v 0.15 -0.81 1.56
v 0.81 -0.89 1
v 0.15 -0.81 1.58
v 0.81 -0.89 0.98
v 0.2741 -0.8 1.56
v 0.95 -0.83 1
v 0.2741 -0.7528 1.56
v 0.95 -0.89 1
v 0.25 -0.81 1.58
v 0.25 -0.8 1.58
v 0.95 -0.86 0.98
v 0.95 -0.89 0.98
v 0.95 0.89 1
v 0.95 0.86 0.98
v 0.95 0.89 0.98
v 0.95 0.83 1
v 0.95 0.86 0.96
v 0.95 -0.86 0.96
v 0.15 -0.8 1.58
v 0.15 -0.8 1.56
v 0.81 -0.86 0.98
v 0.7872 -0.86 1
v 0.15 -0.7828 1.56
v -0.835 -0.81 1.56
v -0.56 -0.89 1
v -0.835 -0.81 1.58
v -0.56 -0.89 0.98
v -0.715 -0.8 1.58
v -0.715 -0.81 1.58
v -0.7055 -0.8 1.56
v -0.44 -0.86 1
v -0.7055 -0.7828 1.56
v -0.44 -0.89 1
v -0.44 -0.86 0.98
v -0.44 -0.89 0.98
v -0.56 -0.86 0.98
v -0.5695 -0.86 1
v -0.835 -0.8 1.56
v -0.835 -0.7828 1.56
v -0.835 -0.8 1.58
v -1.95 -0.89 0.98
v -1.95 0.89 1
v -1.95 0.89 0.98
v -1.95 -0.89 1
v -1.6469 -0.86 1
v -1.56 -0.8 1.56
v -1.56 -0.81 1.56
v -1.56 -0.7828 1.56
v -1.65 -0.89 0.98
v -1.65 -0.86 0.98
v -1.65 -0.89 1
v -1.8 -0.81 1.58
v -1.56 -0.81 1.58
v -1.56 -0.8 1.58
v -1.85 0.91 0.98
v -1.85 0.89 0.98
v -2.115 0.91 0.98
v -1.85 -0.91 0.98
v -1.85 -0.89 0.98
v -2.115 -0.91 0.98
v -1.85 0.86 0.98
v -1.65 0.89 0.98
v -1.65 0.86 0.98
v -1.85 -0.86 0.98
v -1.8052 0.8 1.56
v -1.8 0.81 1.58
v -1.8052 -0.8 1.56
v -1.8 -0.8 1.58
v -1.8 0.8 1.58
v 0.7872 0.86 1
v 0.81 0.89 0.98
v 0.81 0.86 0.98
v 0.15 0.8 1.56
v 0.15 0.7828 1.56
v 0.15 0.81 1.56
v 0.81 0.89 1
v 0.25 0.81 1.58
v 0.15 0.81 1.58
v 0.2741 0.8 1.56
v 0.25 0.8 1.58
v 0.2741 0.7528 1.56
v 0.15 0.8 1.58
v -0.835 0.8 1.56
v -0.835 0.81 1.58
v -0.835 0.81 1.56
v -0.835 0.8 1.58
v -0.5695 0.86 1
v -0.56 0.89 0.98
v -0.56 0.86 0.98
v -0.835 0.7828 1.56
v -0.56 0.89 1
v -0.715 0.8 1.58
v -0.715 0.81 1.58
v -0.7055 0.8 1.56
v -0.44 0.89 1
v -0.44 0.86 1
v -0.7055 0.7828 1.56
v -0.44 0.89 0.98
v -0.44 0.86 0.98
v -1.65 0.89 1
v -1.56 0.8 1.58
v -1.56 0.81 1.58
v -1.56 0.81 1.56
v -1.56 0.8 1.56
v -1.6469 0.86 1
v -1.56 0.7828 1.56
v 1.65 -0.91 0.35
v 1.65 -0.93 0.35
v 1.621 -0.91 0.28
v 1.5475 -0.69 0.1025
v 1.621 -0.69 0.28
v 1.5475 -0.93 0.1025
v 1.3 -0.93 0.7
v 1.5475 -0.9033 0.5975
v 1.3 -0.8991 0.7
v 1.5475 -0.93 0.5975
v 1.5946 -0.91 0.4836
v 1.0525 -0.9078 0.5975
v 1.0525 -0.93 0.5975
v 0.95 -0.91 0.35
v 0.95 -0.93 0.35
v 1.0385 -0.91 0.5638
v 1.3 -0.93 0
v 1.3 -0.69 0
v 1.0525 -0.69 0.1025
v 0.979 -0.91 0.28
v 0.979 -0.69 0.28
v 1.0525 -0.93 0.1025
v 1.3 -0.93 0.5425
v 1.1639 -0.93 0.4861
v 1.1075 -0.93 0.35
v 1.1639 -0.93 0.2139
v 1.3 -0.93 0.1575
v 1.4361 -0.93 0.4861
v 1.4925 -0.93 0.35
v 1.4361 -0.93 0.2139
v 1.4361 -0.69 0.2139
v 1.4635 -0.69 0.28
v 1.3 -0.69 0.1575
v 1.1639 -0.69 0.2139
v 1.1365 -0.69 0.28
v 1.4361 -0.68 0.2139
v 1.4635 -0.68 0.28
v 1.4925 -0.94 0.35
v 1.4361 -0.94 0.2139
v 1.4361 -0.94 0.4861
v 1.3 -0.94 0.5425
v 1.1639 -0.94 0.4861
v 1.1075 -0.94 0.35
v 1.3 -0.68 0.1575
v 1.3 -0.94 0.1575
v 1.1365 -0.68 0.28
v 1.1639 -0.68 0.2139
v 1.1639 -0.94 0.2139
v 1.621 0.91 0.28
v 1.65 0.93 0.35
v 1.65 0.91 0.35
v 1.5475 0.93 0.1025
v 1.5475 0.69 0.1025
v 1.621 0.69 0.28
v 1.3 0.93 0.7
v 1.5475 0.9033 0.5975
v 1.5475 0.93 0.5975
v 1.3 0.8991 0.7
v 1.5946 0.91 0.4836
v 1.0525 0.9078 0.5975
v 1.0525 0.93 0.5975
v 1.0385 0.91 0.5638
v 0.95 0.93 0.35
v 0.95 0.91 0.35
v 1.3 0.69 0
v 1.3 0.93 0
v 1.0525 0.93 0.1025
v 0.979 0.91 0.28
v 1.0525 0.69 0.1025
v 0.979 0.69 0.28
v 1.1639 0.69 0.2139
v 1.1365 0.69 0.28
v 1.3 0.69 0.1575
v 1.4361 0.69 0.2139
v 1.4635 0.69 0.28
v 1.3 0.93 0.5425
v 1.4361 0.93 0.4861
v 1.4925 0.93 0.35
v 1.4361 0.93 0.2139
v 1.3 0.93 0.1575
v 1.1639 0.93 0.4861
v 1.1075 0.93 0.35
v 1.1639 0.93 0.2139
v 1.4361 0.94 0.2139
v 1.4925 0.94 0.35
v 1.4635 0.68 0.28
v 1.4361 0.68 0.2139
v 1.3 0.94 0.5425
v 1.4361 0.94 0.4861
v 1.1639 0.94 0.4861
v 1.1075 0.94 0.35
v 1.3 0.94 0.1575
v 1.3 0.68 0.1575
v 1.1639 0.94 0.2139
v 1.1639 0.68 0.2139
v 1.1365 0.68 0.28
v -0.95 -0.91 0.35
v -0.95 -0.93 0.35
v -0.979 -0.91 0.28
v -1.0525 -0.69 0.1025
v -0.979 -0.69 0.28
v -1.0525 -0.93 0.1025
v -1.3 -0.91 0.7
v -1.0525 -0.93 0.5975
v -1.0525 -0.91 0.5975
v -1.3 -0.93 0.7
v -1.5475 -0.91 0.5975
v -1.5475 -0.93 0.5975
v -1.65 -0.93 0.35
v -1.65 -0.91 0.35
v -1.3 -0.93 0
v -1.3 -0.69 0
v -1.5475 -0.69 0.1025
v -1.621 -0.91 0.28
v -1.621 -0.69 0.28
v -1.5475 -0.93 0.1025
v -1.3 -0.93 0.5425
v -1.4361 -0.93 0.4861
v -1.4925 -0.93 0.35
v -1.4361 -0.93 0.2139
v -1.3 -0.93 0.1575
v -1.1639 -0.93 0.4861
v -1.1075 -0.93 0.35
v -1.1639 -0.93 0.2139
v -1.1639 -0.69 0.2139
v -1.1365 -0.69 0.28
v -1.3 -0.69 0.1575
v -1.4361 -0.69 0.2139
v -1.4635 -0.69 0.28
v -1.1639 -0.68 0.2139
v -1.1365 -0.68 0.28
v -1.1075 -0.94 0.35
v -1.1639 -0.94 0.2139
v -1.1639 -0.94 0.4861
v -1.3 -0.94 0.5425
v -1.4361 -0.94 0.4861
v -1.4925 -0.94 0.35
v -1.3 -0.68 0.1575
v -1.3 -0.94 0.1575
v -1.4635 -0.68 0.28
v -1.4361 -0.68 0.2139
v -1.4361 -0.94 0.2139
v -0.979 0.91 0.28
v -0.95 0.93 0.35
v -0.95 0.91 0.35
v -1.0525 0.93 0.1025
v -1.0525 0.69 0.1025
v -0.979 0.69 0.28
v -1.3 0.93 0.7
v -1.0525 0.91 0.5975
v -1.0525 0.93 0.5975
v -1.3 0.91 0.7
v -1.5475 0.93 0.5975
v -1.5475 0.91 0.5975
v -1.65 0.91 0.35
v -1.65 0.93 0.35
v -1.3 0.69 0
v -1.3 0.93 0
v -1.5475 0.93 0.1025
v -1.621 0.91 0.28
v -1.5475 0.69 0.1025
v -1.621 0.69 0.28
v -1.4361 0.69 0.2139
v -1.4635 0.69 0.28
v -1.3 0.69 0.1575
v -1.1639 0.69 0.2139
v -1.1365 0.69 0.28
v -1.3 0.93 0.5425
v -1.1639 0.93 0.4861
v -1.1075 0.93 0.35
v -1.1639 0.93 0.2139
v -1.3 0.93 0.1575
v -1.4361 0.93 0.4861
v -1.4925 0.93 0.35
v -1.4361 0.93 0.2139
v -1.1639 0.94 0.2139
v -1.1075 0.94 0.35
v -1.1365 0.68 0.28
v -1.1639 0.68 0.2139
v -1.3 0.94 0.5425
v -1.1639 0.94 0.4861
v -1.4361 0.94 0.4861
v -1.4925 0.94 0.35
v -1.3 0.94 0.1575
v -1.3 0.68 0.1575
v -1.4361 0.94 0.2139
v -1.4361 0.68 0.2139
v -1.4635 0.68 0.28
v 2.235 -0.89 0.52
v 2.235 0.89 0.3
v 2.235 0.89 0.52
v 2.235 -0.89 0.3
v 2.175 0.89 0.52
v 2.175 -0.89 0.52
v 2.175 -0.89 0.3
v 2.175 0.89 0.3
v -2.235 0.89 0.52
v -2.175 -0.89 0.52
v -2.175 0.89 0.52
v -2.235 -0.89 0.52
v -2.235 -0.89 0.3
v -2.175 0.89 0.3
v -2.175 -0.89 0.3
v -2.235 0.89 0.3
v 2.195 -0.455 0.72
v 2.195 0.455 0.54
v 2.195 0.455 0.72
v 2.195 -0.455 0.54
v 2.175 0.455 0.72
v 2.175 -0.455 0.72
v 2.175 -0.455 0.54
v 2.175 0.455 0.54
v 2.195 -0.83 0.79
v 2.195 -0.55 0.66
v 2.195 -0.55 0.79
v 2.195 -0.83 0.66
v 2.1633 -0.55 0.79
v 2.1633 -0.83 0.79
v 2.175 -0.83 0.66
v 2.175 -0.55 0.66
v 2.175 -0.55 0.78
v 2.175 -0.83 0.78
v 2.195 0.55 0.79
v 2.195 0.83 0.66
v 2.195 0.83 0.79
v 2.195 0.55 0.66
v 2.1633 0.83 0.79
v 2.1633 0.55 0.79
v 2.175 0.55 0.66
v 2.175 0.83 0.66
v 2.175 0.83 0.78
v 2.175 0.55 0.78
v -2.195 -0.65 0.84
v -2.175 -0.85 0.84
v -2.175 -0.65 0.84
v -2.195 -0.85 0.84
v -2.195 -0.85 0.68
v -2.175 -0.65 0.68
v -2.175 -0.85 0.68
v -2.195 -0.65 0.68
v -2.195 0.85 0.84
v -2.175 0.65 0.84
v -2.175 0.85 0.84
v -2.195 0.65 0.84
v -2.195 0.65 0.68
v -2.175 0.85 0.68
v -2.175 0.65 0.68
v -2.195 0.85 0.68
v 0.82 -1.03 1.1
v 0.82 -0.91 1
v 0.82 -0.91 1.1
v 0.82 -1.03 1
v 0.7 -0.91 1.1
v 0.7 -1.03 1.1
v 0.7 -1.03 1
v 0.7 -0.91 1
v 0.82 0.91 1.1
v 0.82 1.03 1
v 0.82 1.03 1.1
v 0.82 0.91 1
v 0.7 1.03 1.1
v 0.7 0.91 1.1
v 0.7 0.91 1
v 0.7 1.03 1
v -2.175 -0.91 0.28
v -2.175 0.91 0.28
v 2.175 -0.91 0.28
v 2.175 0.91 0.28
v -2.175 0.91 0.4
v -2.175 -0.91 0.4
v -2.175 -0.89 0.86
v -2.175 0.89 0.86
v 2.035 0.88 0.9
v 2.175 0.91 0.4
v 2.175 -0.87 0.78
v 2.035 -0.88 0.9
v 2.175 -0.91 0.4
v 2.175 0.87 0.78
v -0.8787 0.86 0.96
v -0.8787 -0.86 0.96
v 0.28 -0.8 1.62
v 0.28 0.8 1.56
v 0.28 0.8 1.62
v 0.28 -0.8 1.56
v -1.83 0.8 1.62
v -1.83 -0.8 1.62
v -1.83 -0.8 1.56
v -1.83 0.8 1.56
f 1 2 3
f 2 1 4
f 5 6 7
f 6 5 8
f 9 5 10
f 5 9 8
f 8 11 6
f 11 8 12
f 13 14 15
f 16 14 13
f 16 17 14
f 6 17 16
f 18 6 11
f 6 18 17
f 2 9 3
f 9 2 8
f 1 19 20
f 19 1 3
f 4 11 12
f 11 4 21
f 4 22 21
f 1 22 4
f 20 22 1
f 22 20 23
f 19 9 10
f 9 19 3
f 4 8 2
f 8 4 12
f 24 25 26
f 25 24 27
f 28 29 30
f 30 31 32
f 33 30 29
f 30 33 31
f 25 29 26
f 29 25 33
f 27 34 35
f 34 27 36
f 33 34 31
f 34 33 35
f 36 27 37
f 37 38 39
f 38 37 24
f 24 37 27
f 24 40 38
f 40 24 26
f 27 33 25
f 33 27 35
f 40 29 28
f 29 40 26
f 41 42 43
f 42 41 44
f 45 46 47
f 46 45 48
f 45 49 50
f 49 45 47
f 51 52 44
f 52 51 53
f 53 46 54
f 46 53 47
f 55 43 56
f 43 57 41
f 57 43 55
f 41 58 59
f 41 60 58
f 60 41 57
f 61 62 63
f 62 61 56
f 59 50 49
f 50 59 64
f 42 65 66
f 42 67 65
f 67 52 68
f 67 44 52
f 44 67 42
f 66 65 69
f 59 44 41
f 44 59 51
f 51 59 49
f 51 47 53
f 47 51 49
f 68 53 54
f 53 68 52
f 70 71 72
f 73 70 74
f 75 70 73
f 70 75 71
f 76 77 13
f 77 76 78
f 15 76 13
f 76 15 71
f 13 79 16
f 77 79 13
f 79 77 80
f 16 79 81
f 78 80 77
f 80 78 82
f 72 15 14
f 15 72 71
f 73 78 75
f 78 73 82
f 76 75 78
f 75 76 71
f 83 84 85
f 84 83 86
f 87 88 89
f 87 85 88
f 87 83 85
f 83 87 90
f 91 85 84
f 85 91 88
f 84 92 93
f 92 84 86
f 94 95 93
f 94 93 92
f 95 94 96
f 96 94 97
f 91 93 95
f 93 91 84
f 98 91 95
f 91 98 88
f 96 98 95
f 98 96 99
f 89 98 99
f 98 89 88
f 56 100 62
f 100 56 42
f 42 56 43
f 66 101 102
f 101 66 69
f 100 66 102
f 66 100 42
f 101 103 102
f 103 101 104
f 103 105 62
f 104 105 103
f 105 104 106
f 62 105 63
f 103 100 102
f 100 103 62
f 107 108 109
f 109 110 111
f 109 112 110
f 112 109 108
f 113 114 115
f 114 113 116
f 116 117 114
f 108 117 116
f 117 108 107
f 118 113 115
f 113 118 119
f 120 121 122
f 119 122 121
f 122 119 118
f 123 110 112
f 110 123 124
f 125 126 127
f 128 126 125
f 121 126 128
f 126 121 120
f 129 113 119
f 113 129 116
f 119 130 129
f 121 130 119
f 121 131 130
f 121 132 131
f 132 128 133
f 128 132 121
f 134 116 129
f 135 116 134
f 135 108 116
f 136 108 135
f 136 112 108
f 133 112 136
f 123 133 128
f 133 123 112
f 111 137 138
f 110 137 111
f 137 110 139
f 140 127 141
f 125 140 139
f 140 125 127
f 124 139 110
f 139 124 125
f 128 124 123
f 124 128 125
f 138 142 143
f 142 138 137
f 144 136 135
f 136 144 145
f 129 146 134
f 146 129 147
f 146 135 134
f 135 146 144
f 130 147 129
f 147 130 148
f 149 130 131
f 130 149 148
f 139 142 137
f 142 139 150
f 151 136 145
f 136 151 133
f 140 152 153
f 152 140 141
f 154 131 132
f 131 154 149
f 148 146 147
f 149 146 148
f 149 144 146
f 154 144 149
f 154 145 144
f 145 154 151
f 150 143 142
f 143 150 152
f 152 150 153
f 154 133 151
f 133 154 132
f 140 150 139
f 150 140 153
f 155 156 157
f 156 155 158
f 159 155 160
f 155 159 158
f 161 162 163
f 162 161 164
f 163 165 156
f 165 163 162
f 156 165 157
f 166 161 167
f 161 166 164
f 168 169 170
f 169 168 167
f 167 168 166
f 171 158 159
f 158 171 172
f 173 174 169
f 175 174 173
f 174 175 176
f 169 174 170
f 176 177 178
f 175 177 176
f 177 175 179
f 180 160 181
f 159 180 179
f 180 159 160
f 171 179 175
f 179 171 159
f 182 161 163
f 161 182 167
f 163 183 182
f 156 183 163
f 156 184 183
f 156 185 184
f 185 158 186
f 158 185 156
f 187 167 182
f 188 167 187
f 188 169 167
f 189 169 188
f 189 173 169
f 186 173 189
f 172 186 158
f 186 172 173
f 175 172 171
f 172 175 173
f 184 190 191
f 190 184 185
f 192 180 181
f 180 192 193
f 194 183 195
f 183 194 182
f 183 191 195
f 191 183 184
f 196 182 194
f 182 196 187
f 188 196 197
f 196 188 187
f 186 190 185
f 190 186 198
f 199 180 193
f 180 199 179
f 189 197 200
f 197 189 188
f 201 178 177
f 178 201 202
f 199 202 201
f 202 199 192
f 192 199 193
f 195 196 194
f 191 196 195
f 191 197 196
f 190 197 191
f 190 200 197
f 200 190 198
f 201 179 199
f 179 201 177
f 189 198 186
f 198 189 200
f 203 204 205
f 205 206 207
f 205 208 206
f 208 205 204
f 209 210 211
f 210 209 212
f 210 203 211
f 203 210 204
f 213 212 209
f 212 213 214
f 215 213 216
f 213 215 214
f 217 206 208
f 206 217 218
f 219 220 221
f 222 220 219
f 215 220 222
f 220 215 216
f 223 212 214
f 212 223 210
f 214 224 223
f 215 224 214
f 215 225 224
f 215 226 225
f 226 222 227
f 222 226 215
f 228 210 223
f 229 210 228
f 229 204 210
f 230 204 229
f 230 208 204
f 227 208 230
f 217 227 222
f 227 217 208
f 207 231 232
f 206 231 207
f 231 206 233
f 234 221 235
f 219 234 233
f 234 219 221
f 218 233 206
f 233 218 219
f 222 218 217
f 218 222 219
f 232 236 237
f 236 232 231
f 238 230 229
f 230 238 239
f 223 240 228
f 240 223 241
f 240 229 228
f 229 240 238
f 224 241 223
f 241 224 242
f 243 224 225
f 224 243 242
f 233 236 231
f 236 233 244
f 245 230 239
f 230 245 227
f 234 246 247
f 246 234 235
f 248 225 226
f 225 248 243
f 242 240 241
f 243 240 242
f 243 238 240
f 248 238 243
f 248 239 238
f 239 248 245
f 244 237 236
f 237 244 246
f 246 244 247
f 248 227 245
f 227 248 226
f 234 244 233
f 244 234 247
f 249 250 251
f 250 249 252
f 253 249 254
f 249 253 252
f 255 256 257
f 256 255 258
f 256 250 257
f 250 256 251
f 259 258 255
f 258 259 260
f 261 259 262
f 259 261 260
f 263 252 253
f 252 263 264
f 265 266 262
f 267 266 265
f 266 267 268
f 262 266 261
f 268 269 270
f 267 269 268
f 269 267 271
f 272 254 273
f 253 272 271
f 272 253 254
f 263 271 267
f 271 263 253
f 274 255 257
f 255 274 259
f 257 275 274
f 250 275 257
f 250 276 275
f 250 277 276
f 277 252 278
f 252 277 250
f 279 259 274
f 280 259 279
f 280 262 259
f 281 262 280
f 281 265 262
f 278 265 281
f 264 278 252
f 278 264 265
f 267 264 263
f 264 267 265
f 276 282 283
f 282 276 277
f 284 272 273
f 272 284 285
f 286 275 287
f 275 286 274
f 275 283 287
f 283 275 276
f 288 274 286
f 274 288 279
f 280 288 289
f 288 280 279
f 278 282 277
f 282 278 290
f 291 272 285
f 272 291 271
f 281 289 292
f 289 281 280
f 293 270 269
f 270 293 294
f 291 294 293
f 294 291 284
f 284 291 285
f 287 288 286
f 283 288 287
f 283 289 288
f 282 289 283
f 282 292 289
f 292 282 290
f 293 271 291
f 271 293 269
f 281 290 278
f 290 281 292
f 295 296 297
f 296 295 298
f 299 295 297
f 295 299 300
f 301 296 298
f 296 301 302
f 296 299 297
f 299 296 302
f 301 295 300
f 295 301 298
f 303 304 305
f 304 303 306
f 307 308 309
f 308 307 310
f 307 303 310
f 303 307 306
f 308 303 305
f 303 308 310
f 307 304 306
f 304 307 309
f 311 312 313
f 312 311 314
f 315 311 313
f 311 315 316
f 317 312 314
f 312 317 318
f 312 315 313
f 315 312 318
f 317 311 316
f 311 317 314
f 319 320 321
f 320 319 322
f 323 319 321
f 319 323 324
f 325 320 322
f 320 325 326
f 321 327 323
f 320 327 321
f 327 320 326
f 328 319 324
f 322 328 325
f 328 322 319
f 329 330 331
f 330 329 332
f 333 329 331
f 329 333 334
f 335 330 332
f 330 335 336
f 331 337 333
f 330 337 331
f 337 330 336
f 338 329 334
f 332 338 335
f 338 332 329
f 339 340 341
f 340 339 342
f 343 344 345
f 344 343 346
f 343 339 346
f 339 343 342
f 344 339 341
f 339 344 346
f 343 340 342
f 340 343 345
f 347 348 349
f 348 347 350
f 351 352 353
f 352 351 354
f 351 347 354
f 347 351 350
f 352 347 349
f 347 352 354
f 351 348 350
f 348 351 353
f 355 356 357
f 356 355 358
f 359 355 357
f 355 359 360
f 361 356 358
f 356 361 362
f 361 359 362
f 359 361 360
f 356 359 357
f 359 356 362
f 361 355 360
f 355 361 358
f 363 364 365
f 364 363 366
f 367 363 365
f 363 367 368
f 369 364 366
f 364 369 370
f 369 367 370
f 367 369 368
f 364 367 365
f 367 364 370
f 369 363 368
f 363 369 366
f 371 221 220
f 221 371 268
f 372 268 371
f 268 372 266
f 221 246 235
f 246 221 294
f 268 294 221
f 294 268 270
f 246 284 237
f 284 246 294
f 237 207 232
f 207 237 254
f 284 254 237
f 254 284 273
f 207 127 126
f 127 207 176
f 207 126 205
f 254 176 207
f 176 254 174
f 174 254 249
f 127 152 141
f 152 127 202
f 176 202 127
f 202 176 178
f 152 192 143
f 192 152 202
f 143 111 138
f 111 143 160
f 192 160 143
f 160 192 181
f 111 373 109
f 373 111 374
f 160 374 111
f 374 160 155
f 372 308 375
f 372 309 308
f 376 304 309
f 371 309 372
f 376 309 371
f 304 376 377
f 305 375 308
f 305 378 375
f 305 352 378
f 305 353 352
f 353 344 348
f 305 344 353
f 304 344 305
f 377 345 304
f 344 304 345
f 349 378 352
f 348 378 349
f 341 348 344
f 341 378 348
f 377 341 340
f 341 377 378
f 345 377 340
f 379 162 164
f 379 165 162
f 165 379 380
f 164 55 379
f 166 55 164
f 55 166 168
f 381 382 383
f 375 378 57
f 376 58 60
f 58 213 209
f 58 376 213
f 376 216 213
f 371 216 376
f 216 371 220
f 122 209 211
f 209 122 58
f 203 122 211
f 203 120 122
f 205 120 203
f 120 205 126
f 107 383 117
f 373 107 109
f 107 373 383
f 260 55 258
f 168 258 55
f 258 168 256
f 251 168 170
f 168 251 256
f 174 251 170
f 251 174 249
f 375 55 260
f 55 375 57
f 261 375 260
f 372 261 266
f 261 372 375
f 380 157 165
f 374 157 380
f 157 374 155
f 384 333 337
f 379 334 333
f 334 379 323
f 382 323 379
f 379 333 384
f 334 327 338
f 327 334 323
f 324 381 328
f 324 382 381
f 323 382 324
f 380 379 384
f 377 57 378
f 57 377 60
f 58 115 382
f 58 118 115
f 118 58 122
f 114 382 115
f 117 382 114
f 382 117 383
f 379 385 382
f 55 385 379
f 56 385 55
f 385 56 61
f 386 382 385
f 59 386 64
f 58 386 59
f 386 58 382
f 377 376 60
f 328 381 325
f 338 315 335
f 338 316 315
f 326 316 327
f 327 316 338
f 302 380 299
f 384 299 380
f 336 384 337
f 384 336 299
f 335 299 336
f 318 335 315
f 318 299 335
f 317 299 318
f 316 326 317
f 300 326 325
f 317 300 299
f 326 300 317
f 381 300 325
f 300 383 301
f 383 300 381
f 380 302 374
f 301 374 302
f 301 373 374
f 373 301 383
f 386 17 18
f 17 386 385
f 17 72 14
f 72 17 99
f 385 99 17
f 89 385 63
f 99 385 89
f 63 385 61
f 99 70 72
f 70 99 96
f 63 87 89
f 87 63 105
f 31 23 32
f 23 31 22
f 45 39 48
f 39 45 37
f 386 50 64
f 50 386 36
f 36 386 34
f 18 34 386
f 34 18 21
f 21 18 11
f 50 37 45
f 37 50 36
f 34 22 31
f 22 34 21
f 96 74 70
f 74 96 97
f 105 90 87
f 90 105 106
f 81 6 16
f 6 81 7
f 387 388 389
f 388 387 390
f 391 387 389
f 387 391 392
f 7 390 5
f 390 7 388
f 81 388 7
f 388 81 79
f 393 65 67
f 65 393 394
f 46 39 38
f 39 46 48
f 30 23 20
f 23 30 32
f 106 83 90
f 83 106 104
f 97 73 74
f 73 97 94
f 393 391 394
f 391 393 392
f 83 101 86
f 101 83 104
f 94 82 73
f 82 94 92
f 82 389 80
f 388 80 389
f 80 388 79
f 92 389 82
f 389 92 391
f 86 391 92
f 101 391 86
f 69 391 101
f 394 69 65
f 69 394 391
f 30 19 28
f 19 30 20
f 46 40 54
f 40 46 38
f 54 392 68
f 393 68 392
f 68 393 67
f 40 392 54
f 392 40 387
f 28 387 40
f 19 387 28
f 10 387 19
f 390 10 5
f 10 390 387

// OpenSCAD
// file: lib/car_kit.scad
// Car kit — the parts every road vehicle shares (car_sedan.scad,
// car_minisuv.scad, car_suv.scad, car_jeep.scad, car_van.scad), which
// differ in their proportions. world.CarKind names them; the renderer
// draws each kind from its own mesh, tinted per car, with a roof rack or
// box (car_roof_rack.scad, car_roof_box.scad) set on the roof at the
// height in render.carRoofs.
//
//   +X = forward (the car's front faces +X)
//   +Y = lateral (driver's left when facing +X)
//   +Z = up
//
// The paint is near white so the per-car tint is the paint colour;
// glass, tyres, trim and lights are dark or bright enough to read
// through any tint.
//
// Conventions, units, and axis docs: see models-src/README.md.

$fn = 8;

paint  = [0.92, 0.92, 0.92];
glass  = [0.30, 0.40, 0.50];
trim   = [0.16, 0.16, 0.17]; // bumpers, grille, rails, mirrors
tyre   = [0.08, 0.08, 0.08];
hubcap = [0.55, 0.56, 0.58];
lamp   = [1.00, 0.96, 0.82];
tail   = [0.80, 0.12, 0.10];

// slab is a thin box from x0 to x1, centred in Y, its top at z.
module slab(x0, x1, w, z, t = 0.04) {
    translate([x0, -w / 2, z - t]) cube([x1 - x0, w, t]);
}

module wheel(x, y, r, t) {
    translate([x, y, r]) rotate([90, 0, 0]) {
        color(tyre) cylinder(h = t, r = r, center = true);
        color(hubcap) cylinder(h = t + 0.02, r = r * 0.55, center = true);
    }
}

// vehicle draws one car.
//   len, w        overall body length and width
//   r, wb         wheel radius and wheelbase (axles centred on x = axle_x)
//   sill          height of the body's underside
//   belt          the beltline: top of the doors, bottom of the glass
//   hood          top of the hood at the nose (below belt slopes it)
//   nose, tailin  how far the top of the body is drawn in from the
//                 front and back ends (rounding them)
//   roof          roof height
//   gb            [x0, x1] the glass at the beltline
//   gr            [x0, x1] the glass at the roof
//   rails         roof rails (SUVs)
module vehicle(len, w, r, wb, sill, belt, hood, nose, tailin, roof, gb, gr,
               axle_x = 0, rails = false) {
    // Body: a hull from the full-length underside to the beltline at the
    // back and the hood at the nose.
    color(paint) hull() {
        slab(-len / 2, len / 2, w, sill + 0.12, 0.12);
        slab(-len / 2 + tailin, gb[0] + 0.1, w, belt);
        slab(gb[1] - 0.1, len / 2 - nose, w - 0.06, hood);
        slab(-len / 2, -len / 2 + 0.05, w - 0.04, belt - 0.12);
        slab(len / 2 - 0.05, len / 2, w - 0.08, hood - 0.12);
    }
    // Glass greenhouse, and the painted roof on it.
    color(glass) hull() {
        slab(gb[0], gb[1], w - 0.10, belt + 0.02, 0.04);
        slab(gr[0], gr[1], w - 0.26, roof - 0.04, 0.04);
    }
    color(paint) slab(gr[0] - 0.03, gr[1] + 0.03, w - 0.22, roof, 0.06);
    // Pillars down the sides of the glass: the windshield's (A), between
    // the doors (B), and a broad one at the back (C).
    color(paint) for (s = [-1, 1]) {
        pillar(gb[1] - 0.14, gb[1], gr[1] - 0.10, gr[1], s);
        pillar((gb[0] + gb[1]) / 2 - 0.06, (gb[0] + gb[1]) / 2 + 0.06,
               (gr[0] + gr[1]) / 2 - 0.06, (gr[0] + gr[1]) / 2 + 0.06, s);
        pillar(gb[0], gb[0] + 0.30, gr[0], gr[0] + 0.24, s);
    }
    module pillar(b0, b1, r0, r1, s) hull() {
        translate([b0, s * (w - 0.10) / 2 - 0.03, belt]) cube([b1 - b0, 0.06, 0.02]);
        translate([r0, s * (w - 0.26) / 2 - 0.03, roof - 0.06]) cube([r1 - r0, 0.06, 0.02]);
    }
    if (rails)
        color(trim) for (s = [-1, 1])
            translate([gr[0] + 0.05, s * (w / 2 - 0.2) - 0.03, roof])
                cube([gr[1] - gr[0] - 0.1, 0.06, 0.06]);

    // Wheels, flush with the body sides.
    t = 0.24;
    for (x = [axle_x + wb / 2, axle_x - wb / 2], s = [-1, 1])
        wheel(x, s * (w / 2 - t / 2 + 0.02), r, t);

    // Bumpers, grille, lights.
    bz = sill + 0.02;
    color(trim) {
        translate([len / 2 - 0.08, -w / 2 + 0.02, bz]) cube([0.14, w - 0.04, 0.22]);
        translate([-len / 2 - 0.06, -w / 2 + 0.02, bz]) cube([0.14, w - 0.04, 0.22]);
        translate([len / 2 - 0.03, -w * 0.25, bz + 0.24]) cube([0.05, w * 0.5, max(hood - bz - 0.42, 0.12)]);
    }
    lz = hood - 0.16;
    color(lamp) for (s = [-1, 1])
        translate([len / 2 - 0.04, s * (w / 2 - 0.22) - 0.14, lz - 0.08]) cube([0.06, 0.28, 0.13]);
    color(tail) for (s = [-1, 1])
        translate([-len / 2 - 0.02, s * (w / 2 - 0.16) - 0.10, belt - 0.30]) cube([0.06, 0.20, 0.16]);
    // Mirrors.
    color(trim) for (s = [-1, 1])
        translate([gb[1] - 0.25, s * (w / 2 + 0.06) - 0.06, belt + 0.02]) cube([0.12, 0.12, 0.10]);

    echo("MOGUL_META", "footprint", len / 2, w / 2 + 0.08);
}
// main file
// Mini SUV — a small crossover: short hood, tall hatchback, more ground
// clearance than a sedan. Seats four. Parts and conventions:
// lib/car_kit.scad.
include <lib/car_kit.scad>

vehicle(len = 4.35, w = 1.82, r = 0.35, wb = 2.60, sill = 0.28,
        belt = 0.98, hood = 0.90, nose = 0.14, tailin = 0.06,
        roof = 1.62, gb = [-1.95, 0.95], gr = [-1.80, 0.25]);
